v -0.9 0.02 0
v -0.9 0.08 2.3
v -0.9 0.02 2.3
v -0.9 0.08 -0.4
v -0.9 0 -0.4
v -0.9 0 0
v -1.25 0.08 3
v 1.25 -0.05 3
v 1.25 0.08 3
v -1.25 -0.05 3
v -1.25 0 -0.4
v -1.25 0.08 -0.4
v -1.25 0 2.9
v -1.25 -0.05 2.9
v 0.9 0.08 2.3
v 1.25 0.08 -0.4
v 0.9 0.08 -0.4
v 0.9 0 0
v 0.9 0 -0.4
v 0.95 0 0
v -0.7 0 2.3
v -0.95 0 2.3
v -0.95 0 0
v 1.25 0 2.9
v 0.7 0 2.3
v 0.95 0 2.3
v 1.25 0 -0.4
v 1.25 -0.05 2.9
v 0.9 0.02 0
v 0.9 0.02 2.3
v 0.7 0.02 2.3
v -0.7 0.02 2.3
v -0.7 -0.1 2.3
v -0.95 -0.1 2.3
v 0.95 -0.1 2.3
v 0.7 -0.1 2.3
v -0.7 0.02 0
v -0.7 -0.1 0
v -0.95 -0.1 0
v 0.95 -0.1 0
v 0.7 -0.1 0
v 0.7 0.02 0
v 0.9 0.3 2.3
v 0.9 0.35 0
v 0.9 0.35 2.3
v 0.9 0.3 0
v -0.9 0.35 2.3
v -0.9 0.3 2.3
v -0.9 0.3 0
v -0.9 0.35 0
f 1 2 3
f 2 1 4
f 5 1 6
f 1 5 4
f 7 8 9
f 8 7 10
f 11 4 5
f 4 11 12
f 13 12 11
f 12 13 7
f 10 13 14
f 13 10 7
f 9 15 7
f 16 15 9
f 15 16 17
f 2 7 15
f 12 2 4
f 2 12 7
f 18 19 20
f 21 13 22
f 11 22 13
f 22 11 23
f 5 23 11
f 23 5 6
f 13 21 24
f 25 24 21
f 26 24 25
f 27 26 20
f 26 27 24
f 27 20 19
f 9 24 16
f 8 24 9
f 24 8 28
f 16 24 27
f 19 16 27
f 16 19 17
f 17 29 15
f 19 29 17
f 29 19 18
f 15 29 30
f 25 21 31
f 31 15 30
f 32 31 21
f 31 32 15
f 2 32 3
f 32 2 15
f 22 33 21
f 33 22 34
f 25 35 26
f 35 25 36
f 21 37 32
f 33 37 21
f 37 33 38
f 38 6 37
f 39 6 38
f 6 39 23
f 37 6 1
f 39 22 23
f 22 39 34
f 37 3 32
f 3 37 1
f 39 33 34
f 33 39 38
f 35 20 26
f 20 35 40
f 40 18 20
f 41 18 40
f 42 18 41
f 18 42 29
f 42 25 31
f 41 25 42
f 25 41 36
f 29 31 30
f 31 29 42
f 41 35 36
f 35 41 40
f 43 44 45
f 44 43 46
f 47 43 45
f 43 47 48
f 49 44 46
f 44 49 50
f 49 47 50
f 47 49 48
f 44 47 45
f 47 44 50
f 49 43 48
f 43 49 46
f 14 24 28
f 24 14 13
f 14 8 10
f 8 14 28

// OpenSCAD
// Tent shell kit: door. See lib/lodge_kit.scad.
include <lib/lodge_kit.scad>
kind = "tent";
door();
